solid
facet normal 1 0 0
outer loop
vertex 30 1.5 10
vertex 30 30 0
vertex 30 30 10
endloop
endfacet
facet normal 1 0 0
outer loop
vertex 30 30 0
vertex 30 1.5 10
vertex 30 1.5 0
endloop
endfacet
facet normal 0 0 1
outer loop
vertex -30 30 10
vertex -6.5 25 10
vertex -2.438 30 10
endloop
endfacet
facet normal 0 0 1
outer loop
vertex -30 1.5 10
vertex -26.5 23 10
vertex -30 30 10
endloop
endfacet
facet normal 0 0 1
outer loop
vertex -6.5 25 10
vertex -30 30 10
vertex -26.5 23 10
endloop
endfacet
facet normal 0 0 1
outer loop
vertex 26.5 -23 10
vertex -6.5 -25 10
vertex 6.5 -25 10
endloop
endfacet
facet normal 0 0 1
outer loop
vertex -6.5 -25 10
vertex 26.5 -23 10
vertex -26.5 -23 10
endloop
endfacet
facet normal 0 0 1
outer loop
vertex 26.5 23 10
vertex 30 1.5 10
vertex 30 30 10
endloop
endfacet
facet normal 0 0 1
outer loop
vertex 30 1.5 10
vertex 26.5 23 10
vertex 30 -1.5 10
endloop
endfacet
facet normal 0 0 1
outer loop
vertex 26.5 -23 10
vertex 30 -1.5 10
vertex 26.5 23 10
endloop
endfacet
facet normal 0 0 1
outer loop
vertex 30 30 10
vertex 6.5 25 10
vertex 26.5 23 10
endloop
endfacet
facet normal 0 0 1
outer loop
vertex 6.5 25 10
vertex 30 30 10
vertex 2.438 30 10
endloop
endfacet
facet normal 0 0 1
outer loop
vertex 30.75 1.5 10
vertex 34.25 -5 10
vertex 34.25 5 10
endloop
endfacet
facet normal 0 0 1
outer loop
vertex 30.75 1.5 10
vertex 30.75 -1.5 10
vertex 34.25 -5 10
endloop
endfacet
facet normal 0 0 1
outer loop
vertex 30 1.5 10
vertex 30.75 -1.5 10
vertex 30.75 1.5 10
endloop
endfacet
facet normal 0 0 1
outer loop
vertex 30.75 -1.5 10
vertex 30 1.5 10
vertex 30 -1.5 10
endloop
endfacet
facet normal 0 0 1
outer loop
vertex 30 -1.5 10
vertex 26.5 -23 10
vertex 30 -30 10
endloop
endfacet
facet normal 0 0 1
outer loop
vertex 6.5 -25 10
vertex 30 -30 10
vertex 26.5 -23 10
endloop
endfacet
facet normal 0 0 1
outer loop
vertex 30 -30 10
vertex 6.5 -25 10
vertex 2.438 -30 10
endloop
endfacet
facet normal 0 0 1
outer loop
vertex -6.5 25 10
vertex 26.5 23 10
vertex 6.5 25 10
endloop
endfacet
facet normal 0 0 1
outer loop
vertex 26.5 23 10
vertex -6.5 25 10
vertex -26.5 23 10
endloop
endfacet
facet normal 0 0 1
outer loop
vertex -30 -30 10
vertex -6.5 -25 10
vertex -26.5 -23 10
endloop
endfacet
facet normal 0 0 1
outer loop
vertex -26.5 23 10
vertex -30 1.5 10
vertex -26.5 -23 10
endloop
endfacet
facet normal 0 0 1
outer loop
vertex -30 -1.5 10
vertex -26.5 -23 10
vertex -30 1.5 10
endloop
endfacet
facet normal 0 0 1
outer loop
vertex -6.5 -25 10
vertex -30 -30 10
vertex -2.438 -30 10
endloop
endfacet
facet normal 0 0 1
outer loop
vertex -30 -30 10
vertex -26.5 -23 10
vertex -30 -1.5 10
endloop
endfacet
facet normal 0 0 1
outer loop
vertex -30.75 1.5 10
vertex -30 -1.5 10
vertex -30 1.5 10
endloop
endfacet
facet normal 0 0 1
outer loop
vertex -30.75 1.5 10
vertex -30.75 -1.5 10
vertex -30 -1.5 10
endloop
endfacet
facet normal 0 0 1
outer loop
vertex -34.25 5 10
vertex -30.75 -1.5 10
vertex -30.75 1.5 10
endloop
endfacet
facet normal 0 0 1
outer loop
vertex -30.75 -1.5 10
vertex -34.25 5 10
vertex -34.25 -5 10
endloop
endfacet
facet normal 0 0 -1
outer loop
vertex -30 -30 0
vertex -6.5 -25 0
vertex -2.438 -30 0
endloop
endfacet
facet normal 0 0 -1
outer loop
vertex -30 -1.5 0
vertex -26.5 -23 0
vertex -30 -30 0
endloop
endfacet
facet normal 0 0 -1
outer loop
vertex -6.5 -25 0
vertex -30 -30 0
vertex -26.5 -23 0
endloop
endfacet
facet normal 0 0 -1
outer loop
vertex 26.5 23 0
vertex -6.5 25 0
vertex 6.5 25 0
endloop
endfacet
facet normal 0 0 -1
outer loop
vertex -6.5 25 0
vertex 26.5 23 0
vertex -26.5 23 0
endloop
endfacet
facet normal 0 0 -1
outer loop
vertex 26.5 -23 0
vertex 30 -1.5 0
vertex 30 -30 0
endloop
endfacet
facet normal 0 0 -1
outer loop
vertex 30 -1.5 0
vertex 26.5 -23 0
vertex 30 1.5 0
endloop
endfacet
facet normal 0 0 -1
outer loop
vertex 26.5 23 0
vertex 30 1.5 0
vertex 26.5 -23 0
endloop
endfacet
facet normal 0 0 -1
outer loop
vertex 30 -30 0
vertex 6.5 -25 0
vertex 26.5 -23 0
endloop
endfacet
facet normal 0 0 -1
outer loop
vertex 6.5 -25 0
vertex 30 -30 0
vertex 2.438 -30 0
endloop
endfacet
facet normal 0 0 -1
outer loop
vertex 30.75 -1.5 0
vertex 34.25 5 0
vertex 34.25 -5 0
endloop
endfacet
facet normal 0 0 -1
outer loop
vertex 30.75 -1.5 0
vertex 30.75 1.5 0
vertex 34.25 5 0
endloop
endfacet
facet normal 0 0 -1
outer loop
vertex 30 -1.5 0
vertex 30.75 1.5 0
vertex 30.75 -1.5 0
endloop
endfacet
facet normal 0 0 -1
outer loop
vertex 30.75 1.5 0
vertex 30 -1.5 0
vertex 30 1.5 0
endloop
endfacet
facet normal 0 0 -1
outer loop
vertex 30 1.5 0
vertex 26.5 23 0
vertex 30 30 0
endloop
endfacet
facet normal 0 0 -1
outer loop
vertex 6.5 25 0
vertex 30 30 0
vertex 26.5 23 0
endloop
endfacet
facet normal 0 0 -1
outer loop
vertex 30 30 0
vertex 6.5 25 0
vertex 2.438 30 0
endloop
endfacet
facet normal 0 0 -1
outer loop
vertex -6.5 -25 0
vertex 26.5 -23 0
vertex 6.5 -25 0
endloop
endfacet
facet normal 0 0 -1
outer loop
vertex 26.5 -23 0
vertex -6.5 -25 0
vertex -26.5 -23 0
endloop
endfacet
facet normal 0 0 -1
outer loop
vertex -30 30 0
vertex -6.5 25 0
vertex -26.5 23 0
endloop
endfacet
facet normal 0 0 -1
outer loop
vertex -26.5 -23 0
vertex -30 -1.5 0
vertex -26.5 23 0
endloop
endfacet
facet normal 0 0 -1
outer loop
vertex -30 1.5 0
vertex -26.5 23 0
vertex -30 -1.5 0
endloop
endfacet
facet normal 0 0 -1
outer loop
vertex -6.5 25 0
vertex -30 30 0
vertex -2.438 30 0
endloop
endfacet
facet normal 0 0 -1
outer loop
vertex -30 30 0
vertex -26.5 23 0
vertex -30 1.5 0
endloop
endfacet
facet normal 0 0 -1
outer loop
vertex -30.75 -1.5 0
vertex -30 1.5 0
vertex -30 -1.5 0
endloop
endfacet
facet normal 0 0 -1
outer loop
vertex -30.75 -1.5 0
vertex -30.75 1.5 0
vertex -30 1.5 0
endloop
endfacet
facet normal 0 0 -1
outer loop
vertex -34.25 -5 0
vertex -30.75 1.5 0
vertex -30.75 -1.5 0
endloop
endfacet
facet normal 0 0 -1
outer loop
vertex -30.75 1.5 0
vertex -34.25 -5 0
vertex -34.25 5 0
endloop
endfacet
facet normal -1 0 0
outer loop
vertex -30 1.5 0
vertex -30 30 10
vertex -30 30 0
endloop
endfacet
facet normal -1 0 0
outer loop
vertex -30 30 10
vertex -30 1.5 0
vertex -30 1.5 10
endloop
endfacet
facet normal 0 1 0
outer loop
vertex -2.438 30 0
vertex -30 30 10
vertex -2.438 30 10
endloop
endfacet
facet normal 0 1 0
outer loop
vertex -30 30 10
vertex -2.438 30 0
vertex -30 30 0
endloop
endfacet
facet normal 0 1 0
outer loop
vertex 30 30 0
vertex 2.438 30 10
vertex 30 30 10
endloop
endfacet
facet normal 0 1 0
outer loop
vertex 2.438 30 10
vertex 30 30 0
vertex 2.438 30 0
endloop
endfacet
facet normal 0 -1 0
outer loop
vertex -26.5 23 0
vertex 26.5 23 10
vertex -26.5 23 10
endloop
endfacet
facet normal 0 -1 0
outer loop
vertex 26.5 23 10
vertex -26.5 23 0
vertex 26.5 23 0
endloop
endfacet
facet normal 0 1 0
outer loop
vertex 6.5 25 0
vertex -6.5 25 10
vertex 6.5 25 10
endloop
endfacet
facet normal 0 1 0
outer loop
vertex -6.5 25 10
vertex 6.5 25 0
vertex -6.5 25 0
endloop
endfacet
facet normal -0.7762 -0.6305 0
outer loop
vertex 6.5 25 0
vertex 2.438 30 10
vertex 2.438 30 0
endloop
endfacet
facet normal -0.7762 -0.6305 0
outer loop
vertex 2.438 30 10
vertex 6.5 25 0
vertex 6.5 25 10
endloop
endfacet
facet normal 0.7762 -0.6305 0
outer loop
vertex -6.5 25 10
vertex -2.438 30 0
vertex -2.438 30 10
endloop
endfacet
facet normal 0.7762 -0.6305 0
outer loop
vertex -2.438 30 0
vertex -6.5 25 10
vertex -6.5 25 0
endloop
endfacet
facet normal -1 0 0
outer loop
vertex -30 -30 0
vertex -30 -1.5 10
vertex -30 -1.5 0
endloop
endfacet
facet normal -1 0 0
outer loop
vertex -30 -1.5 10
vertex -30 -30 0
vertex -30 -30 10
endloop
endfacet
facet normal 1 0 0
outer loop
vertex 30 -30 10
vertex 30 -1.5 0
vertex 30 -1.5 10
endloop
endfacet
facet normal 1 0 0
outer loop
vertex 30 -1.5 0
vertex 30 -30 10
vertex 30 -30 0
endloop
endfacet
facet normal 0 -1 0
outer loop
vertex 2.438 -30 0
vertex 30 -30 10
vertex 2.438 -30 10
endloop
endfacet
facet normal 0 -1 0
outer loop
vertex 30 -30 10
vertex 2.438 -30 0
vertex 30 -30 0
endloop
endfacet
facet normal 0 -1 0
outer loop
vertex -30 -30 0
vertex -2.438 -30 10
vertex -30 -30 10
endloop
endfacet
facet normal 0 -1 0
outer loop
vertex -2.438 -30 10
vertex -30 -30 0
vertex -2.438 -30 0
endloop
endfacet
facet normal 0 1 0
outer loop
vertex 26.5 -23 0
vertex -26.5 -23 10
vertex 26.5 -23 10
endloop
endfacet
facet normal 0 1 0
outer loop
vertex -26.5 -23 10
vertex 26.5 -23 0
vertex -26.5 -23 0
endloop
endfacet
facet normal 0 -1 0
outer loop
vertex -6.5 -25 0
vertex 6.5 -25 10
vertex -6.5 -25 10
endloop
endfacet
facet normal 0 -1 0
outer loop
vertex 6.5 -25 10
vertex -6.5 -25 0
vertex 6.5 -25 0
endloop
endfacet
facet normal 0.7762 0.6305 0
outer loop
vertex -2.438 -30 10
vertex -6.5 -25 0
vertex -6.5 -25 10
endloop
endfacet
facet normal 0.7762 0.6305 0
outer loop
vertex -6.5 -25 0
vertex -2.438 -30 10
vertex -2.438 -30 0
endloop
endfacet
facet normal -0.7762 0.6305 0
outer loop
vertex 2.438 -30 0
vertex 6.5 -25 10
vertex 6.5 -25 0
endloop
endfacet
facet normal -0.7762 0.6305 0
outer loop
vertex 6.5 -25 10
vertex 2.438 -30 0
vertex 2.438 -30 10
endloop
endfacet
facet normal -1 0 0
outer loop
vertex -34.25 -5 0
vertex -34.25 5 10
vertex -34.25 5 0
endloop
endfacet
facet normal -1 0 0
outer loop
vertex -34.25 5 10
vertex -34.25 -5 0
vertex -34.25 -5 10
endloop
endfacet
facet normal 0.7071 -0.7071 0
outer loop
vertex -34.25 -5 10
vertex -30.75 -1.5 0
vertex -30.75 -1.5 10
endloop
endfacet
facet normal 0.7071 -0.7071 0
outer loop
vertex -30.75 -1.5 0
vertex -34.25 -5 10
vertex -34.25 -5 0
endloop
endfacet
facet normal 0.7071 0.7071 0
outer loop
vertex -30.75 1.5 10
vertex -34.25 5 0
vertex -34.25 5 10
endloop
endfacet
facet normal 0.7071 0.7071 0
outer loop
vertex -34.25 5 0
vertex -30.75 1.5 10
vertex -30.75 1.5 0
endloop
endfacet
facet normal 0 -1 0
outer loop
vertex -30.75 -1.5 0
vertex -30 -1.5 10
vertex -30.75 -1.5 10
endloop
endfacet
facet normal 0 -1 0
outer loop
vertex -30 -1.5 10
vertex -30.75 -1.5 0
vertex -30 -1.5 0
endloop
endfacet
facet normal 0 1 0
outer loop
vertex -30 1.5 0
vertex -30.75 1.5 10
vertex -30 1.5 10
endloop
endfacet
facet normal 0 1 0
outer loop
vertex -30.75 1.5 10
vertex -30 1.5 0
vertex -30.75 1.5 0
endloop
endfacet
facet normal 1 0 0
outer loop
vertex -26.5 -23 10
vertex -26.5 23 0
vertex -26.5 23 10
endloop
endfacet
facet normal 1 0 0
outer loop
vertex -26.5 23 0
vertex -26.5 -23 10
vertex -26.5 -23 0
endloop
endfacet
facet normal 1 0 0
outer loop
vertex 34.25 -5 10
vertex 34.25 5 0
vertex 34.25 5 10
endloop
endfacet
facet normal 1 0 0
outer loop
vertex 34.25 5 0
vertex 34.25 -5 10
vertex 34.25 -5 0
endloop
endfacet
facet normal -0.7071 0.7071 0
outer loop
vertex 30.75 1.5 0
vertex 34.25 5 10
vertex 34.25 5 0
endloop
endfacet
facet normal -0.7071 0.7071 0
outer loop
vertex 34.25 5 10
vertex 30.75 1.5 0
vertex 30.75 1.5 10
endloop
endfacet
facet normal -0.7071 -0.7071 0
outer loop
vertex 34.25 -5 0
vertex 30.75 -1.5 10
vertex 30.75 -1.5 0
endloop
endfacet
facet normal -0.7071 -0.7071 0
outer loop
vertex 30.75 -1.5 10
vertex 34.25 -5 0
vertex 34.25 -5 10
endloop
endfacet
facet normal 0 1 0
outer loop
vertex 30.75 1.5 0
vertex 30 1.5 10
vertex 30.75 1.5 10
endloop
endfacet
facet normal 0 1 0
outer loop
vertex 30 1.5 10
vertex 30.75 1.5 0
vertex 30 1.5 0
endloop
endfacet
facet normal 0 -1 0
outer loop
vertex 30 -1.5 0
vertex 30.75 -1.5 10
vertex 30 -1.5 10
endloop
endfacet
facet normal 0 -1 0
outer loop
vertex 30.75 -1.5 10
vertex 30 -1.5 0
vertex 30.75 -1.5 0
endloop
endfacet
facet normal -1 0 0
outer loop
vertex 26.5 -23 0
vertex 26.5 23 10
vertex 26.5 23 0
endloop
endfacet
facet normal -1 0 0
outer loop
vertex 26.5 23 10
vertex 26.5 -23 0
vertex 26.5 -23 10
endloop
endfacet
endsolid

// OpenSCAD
union() {
	translate(v = [0, 30.0000000000, 0]) {
		difference() {
			union() {
				translate(v = [0, -1.7500000000, 0]) {
					translate(v = [0, 0, 5.0000000000]) {
						cube(center = true, size = [60, 3.5000000000, 10]);
					}
				}
				translate(v = [0, -3.5000000000, 0]) {
					translate(v = [0, -1.7500000000, 0]) {
						translate(v = [0, 0, 5.0000000000]) {
							cube(center = true, size = [60, 3.5000000000, 10]);
						}
					}
				}
			}
			translate(v = [0, -1.0000000000, 0]) {
				translate(v = [0, -4.0000000000, 0]) {
					translate(v = [-6.5000000000, 0, 0]) {
						linear_extrude(height = 10) {
							polygon(points = [[0, 0], [13, 0], [6.5000000000, 8]]);
						}
					}
				}
			}
		}
	}
	rotate(a = [0, 0, 180]) {
		translate(v = [0, 30.0000000000, 0]) {
			difference() {
				union() {
					translate(v = [0, -1.7500000000, 0]) {
						translate(v = [0, 0, 5.0000000000]) {
							cube(center = true, size = [60, 3.5000000000, 10]);
						}
					}
					translate(v = [0, -3.5000000000, 0]) {
						translate(v = [0, -1.7500000000, 0]) {
							translate(v = [0, 0, 5.0000000000]) {
								cube(center = true, size = [60, 3.5000000000, 10]);
							}
						}
					}
				}
				translate(v = [0, -1.0000000000, 0]) {
					translate(v = [0, -4.0000000000, 0]) {
						translate(v = [-6.5000000000, 0, 0]) {
							linear_extrude(height = 10) {
								polygon(points = [[0, 0], [13, 0], [6.5000000000, 8]]);
							}
						}
					}
				}
			}
		}
	}
	translate(v = [-30.0000000000, 0, 0]) {
		rotate(a = [0, 0, 90]) {
			union() {
				translate(v = [0, -1.7500000000, 0]) {
					translate(v = [0, 0, 5.0000000000]) {
						cube(center = true, size = [60, 3.5000000000, 10]);
					}
				}
				translate(v = [0, 1.7500000000, 0]) {
					rotate(a = [0, 0, 180]) {
						union() {
							translate(v = [0, -2.5000000000, 0]) {
								translate(v = [-5.0000000000, 0, 0]) {
									linear_extrude(height = 10) {
										polygon(points = [[0, 0], [10, 0], [5.0000000000, 5]]);
									}
								}
							}
							translate(v = [0, 2.5000000000, 0]) {
								translate(v = [0, 0, 5.0000000000]) {
									cube(center = true, size = [3, 3, 10]);
								}
							}
						}
					}
				}
			}
		}
	}
	rotate(a = [0, 0, 180]) {
		translate(v = [-30.0000000000, 0, 0]) {
			rotate(a = [0, 0, 90]) {
				union() {
					translate(v = [0, -1.7500000000, 0]) {
						translate(v = [0, 0, 5.0000000000]) {
							cube(center = true, size = [60, 3.5000000000, 10]);
						}
					}
					translate(v = [0, 1.7500000000, 0]) {
						rotate(a = [0, 0, 180]) {
							union() {
								translate(v = [0, -2.5000000000, 0]) {
									translate(v = [-5.0000000000, 0, 0]) {
										linear_extrude(height = 10) {
											polygon(points = [[0, 0], [10, 0], [5.0000000000, 5]]);
										}
									}
								}
								translate(v = [0, 2.5000000000, 0]) {
									translate(v = [0, 0, 5.0000000000]) {
										cube(center = true, size = [3, 3, 10]);
									}
								}
							}
						}
					}
				}
			}
		}
	}
}
